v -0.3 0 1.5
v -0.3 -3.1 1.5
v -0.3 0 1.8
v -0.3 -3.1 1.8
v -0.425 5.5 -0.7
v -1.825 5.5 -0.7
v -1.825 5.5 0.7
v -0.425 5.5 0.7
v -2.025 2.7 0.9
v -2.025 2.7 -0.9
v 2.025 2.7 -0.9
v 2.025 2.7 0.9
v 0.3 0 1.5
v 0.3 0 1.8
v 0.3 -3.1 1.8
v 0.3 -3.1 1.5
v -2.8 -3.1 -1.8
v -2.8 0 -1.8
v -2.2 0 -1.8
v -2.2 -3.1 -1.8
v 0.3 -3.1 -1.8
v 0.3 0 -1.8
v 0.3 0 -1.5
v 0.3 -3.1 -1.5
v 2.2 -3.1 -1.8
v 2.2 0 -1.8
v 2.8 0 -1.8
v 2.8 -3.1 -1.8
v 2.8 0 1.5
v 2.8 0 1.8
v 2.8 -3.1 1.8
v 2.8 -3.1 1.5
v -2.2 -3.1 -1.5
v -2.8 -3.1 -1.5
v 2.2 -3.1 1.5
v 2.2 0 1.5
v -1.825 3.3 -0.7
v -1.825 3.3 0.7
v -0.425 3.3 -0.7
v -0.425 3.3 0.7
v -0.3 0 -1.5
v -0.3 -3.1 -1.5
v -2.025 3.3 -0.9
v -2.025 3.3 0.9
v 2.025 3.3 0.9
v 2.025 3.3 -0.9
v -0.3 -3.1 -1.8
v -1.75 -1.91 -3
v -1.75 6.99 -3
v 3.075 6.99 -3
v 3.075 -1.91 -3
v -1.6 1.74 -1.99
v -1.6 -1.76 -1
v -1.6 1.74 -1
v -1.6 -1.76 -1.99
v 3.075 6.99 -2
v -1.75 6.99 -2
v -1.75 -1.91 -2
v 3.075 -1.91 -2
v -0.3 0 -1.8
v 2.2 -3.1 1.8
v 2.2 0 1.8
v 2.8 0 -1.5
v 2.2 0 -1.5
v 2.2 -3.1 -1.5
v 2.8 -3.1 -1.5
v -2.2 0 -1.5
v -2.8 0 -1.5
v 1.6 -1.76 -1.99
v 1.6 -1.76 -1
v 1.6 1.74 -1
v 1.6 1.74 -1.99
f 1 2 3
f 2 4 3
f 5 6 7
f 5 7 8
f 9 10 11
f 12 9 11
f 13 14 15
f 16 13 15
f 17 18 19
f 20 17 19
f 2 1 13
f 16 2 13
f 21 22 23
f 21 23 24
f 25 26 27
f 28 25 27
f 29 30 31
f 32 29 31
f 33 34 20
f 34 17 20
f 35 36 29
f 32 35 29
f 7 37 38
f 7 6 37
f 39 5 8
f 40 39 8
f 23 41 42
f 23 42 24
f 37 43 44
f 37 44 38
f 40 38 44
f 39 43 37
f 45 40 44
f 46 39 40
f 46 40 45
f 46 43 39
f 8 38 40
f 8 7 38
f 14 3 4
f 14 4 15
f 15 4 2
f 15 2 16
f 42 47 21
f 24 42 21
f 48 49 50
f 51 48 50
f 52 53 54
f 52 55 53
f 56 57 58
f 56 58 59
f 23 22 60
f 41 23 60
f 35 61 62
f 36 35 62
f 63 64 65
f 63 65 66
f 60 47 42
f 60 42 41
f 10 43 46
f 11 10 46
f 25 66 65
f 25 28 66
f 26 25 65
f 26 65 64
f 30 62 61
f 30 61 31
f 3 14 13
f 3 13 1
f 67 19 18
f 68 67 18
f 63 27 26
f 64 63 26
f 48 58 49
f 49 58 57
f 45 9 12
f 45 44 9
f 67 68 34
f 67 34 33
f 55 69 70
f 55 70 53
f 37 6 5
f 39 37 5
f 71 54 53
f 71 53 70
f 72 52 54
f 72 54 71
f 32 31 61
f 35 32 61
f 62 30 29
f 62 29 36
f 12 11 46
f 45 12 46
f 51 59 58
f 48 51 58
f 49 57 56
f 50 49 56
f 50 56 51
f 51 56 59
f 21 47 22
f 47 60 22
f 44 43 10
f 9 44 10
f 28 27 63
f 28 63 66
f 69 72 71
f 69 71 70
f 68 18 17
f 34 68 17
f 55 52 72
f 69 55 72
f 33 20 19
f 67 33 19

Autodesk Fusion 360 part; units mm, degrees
sketch "Sketch1" plane through (0, 0, 0) normal (0, 0, 1) x (1, 0, 0)
  line L0 (-4.525, 3.5) -> (4.525, 3.5)
  line L1 (4.525, 3.5) -> (4.525, 0)
  line L2 (4.525, 0) -> (-4.525, 0)
  line L3 (-4.525, 0) -> (-4.525, 3.5)
  line L4 (-1.825, 5.5) -> (-0.425, 5.5)
  line L5 (-0.425, 5.5) -> (-0.425, 3.5)
  line L6 (-0.425, 3.5) -> (-1.825, 3.5)
  line L7 (-1.825, 3.5) -> (-1.825, 5.5)
  line L8 (-4.525, 0) -> (-4.525, -3.1) construction
  line L9 (-4.525, -3.1) -> (4.525, -3.1) construction
  line L10 (4.525, -3.1) -> (4.525, 0) construction
  line L11 (0, 0) -> (0, -3.1) construction
  line L12 (0.3, 0) -> (0.3, -3.1)
  line L13 (-0.3, -3.1) -> (-0.3, 0)
  line L14 (0.3, -1.55) -> (-0.3, -1.55) construction
  line L15 (-0.3, -3.1) -> (0.3, -3.1)
  line L16 (-2.8, 0) -> (-2.8, -3.1)
  line L17 (-2.2, -3.1) -> (-2.2, 0)
  line L18 (-2.5, 0) -> (-2.5, -3.1) construction
  line L19 (-2.8, -3.1) -> (-2.2, -3.1)
  line L20 (-2.8, -1.55) -> (-2.2, -1.55) construction
  line L21 (2.5, 0) -> (2.5, -3.1) construction
  line L22 (2.8, 0) -> (2.8, -3.1)
  line L23 (2.2, -3.1) -> (2.2, 0)
  line L24 (2.2, -1.55) -> (2.8, -1.55) construction
  line L25 (2.8, -3.1) -> (2.2, -3.1)
  line L26 (-2.025, 3.5) -> (-2.025, 2.9)
  line L27 (-2.025, 2.9) -> (2.025, 2.9)
  line L28 (2.025, 2.9) -> (2.025, 3.5)
  line L29 (-0.425, 5.5) -> (1.825, 5.5) construction
  line L30 (1.825, 5.5) -> (1.825, 3.5) construction
  dimension "d1" = 9.05
  dimension "d2" = 3.5
  dimension "d3" = 2
  dimension "d4" = 1.4
  dimension "d5" = 2.7
  dimension "d6" = 6.6
  dimension "d7" = 0.6
  dimension "d8" = 2.5
  dimension "d9" = 2.5
  dimension "d24" = 0.6
  dimension "d25" = 0.2
  dimension "d26" = 2.7
  dimension "d27" = 0.2
extrude "Extrude2" add sketch "Sketch1" along normal blind 1.8 and the other way blind 1.8 contours L0 L1 L2 L3 L26 L27 L28 | L0 L6 L26 L27 L28 makes body 1
extrude "Extrude1" add sketch "Sketch1" against normal blind 0.3 from surface at 1.8 separate body contours L2 L16 L17 L19 | L2 L12 L13 L15 | L2 L22 L23 L25 makes body 2 at (-2.6, -1.0333, 1.8) makes body 3 at (-0.1, -1.0333, 1.8) makes body 4 at (2.4, -1.0333, 1.8)
extrude "Extrude3" add sketch "Sketch1" along normal blind 0.3 from surface at -1.8 separate body contours L2 L16 L17 L19 | L2 L12 L13 L15 | L2 L22 L23 L25 makes body 5 at (-2.6, -1.0333, -1.8) makes body 6 at (-0.1, -1.0333, -1.8) makes body 7 at (2.4, -1.0333, -1.8)
extrude "Extrude4" add sketch "Sketch1" along normal blind 0.7 and the other way blind 0.7 separate body contours L0 L4 L5 L6 L7 makes body 8
extrude "Extrude5" add sketch "Sketch1" along normal up to surface (0.9 mm away) and the other way up to surface (0.9 mm away) separate body contours L0 L6 L26 L27 L28 makes body 9
combine "Combine1" operation cut target body 1 tool bodies 9 keep tools
move_body "Move1" bodies 9 to x (1, 0, 0) y (0, 1, 0) z (0, 0, 1) at (0, -0.2, 0)
extrude "Extrude6" add 1 faces at (-1.3583, 3.5, -0.2333) along direction (0, -1, 0) blind 0.5 on bodies 8 bodies 8 9

Autodesk Fusion 360 part; units mm, degrees
ref_plane "WorkPlane1" through (0, 0, -2) normal (0, 0, 1) x (1, 0, 0)
sketch "top" plane through (0, 0, -2) normal (0, 0, 1) x (1, 0, 0)
  line L0 (-1.75, 6.99) -> (3.075, 6.99)
  line L1 (3.075, 6.99) -> (3.075, -1.91)
  line L2 (3.075, -1.91) -> (-1.75, -1.91)
  line L3 (-1.75, -1.91) -> (-1.75, 6.99)
  line L4 (-1.6, 1.74) -> (1.6, 1.74)
  line L5 (1.6, 1.74) -> (1.6, -1.76)
  line L6 (1.6, -1.76) -> (-1.6, -1.76)
  line L7 (-1.6, -1.76) -> (-1.6, 1.74)
  line L8 (0, 0) -> (0, 1.74) construction
  dimension "d1" = 8.9
  dimension "d2" = 4.825
  dimension "d3" = 3.5
  dimension "d4" = 3.2
  dimension "d21" = 0.15
  dimension "d22" = 0.15
  dimension "d23" = 1.74
extrude "Extrude3" add sketch "top" against normal blind 1 contours L0 L1 L2 L3 | L4 L5 L6 L7 makes body 1
ref_plane "WorkPlane2" through (0, 0, -1) normal (0, 0, 1) x (1, 0, 0)
extrude "Extrude4" add sketch "top" along normal up to surface (0.99 mm away) from surface at 0.01 separate body contours L4 L5 L6 L7 makes body 2
